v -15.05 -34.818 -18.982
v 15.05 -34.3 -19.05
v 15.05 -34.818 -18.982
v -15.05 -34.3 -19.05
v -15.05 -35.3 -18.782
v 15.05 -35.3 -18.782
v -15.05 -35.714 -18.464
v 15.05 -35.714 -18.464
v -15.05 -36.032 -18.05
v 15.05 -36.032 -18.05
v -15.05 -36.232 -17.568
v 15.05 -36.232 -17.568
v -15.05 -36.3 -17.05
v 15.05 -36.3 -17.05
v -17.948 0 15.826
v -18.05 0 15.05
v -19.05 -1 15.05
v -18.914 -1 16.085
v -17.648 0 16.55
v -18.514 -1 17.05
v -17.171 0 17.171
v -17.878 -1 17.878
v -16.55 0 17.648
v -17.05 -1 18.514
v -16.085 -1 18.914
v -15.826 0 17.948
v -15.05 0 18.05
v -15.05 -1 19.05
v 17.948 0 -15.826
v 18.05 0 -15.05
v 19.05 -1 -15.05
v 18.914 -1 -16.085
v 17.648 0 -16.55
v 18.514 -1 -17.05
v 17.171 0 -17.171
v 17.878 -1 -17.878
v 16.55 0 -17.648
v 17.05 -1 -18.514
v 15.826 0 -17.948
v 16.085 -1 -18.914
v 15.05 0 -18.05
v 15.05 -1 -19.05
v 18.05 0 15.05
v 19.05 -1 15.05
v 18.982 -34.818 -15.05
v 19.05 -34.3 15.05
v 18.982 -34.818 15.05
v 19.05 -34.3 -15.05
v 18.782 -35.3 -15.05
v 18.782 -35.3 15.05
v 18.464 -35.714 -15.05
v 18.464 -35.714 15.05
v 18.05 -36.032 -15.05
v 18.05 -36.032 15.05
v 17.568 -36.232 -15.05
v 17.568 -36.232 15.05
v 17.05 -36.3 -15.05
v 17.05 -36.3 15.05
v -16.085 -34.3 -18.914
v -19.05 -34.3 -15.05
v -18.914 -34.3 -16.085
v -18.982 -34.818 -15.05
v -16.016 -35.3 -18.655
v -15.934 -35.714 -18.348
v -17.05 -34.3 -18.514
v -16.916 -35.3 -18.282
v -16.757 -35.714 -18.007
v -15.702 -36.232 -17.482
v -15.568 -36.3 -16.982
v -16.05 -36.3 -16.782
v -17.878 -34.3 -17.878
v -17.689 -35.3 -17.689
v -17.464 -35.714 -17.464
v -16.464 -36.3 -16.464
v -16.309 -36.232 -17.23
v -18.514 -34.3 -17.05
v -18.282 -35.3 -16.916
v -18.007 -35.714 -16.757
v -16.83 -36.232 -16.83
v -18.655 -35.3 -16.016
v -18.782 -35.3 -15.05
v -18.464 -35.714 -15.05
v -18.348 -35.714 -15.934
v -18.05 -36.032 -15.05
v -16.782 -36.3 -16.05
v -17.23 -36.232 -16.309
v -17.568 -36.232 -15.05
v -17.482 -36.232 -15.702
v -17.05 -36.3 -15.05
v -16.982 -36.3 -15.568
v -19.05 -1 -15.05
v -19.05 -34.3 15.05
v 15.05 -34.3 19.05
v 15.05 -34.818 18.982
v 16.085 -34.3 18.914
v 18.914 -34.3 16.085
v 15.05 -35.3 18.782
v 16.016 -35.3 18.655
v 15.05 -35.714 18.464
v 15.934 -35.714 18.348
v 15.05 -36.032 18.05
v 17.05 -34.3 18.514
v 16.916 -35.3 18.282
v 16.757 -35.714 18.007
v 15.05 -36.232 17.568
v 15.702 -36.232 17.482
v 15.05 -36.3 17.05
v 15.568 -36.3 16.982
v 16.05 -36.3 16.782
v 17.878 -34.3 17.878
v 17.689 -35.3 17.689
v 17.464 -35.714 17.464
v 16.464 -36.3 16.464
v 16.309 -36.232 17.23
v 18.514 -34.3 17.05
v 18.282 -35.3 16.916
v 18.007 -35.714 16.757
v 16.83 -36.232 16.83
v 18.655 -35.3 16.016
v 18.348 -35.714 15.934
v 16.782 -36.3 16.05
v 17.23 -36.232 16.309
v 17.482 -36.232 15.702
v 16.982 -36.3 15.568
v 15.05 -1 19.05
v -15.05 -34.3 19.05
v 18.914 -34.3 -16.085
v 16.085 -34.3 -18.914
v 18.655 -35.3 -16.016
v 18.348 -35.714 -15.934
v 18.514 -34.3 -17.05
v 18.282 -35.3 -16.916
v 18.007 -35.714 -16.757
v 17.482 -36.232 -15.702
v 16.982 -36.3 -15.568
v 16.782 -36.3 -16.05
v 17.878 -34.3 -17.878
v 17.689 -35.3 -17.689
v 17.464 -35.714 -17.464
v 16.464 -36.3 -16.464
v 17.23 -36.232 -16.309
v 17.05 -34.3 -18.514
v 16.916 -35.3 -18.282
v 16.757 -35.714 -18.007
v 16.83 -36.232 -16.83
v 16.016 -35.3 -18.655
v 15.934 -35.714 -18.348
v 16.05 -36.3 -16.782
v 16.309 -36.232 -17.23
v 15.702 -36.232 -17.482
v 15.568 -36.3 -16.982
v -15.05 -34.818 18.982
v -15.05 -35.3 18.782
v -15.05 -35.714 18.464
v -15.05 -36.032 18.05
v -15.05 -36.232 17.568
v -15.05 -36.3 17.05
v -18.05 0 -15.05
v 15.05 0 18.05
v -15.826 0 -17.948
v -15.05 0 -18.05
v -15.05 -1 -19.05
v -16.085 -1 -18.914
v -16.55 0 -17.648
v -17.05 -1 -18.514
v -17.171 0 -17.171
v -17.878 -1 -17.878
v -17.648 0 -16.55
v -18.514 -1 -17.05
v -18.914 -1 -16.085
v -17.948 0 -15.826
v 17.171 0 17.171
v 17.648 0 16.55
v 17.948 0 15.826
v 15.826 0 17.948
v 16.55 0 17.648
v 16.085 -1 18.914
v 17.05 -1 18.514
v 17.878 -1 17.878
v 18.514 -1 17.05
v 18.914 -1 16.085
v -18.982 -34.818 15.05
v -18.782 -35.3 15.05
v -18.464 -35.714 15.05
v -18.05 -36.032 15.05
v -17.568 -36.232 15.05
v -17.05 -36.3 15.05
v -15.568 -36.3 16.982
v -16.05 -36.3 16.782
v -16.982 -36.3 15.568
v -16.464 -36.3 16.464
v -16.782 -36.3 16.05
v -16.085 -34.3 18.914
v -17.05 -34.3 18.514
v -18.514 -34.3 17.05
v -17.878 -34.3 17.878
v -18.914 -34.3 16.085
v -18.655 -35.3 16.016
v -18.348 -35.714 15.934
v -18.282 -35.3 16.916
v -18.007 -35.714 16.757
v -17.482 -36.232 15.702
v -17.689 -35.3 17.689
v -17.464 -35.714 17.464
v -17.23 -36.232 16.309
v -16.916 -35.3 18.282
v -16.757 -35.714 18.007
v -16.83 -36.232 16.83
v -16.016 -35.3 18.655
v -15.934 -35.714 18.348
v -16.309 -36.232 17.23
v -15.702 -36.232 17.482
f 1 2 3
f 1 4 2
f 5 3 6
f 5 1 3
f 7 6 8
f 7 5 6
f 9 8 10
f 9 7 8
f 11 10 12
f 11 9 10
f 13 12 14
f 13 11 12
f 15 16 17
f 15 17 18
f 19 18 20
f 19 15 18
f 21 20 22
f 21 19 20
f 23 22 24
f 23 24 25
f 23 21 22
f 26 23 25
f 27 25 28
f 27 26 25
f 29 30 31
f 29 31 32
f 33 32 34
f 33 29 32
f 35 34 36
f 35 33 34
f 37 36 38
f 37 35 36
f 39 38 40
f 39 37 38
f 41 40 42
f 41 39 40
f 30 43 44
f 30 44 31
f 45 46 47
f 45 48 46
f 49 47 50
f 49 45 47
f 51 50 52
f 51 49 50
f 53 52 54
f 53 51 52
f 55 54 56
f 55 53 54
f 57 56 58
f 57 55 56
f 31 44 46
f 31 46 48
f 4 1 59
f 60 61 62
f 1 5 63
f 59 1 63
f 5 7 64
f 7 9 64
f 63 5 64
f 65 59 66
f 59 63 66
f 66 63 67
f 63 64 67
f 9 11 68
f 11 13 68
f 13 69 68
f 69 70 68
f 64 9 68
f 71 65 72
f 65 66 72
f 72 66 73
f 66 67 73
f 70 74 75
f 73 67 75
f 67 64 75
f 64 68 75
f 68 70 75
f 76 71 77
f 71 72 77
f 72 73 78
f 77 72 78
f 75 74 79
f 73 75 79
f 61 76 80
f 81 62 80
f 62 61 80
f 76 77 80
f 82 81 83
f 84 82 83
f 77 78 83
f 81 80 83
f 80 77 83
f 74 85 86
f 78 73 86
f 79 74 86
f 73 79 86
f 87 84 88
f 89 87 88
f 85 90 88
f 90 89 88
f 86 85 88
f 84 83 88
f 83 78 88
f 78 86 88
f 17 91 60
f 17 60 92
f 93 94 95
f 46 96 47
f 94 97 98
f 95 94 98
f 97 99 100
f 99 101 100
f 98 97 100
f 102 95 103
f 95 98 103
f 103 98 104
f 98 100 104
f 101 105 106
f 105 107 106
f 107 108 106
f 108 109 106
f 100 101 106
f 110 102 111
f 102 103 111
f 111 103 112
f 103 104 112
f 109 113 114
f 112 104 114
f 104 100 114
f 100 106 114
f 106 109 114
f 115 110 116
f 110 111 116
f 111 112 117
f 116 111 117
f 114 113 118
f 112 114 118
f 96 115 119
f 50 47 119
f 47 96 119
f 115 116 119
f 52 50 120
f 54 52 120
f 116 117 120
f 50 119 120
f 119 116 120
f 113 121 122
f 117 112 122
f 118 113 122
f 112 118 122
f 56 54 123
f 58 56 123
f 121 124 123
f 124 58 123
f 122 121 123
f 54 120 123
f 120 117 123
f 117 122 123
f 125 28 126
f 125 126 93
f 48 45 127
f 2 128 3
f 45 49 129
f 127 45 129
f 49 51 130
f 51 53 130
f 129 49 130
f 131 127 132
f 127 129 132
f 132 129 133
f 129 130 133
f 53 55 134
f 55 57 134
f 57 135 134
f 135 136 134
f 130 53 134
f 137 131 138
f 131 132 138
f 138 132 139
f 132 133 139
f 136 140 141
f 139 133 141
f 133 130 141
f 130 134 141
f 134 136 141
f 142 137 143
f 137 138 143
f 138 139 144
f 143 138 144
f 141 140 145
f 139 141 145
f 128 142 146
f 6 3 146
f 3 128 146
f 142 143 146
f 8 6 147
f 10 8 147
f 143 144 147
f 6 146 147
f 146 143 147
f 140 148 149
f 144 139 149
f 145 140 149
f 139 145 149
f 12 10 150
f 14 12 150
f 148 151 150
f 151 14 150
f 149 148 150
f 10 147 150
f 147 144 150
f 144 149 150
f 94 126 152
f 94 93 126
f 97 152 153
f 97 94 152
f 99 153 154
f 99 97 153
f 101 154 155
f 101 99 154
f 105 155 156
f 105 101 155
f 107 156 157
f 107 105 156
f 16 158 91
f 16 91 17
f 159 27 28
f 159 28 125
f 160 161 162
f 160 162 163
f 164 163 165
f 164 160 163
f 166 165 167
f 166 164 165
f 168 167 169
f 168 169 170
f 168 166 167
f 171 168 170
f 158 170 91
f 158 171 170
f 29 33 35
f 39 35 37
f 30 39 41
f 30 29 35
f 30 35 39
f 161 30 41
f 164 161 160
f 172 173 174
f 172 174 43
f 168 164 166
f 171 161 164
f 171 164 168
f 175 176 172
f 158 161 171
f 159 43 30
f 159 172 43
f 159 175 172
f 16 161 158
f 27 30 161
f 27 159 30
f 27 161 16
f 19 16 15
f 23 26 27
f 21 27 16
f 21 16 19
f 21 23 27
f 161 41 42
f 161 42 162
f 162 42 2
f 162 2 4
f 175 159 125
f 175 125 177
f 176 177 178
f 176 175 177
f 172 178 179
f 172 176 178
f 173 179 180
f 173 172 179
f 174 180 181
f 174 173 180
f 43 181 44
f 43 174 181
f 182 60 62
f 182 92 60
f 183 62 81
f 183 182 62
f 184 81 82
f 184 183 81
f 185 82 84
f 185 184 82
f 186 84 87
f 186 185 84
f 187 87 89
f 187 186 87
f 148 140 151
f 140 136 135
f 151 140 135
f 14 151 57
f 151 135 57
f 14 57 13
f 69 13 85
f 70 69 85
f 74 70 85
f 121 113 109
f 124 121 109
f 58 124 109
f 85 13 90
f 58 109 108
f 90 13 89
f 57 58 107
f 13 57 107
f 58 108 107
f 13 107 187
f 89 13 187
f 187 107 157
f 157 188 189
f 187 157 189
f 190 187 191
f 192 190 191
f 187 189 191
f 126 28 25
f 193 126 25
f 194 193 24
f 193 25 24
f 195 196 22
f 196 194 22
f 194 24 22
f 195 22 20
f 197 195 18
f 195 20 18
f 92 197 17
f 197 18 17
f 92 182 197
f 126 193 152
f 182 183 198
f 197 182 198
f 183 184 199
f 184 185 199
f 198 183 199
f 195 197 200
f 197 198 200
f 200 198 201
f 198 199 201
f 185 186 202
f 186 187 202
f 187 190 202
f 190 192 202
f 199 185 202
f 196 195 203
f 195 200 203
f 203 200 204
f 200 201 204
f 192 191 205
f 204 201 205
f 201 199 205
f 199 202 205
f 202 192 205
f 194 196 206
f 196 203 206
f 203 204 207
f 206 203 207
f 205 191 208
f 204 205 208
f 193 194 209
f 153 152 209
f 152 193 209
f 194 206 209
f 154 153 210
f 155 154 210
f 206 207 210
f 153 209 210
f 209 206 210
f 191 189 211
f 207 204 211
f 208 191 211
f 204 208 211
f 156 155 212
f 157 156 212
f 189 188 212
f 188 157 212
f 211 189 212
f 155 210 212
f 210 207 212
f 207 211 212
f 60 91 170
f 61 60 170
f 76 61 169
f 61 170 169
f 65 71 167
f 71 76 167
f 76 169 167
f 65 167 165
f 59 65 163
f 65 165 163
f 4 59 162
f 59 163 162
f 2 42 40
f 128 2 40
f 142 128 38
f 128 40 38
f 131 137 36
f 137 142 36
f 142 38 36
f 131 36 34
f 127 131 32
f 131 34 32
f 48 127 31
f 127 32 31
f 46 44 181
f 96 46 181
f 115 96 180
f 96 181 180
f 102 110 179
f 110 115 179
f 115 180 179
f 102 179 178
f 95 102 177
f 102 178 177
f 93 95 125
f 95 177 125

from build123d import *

# Parameters (mm, degrees)
PAD_DEPTH    = 36.3
CHAMFER_SIZE = 1
FILLET_R     = 2


with BuildPart() as part:
    # Sketch → Pad (new body)
    with BuildSketch(Plane.XZ):
        with BuildLine():
            Line((-15.05, 19.05), (15.05, 19.05))
            ThreePointArc((19.05, 15.05), (17.878427, 17.878427), (15.05, 19.05))
            Line((19.05, 15.05), (19.05, -15.05))
            ThreePointArc((15.05, -19.05), (17.878427, -17.878427), (19.05, -15.05))
            Line((15.05, -19.05), (-15.05, -19.05))
            ThreePointArc((-19.05, -15.05), (-17.878427, -17.878427), (-15.05, -19.05))
            Line((-19.05, -15.05), (-19.05, 15.05))
            ThreePointArc((-15.05, 19.05), (-17.878427, 17.878427), (-19.05, 15.05))
        make_face()
    extrude(amount=PAD_DEPTH)

    # Chamfer
    chamfer_edges = [part.edges().sort_by_distance(p)[0] for p in [
        (0, 0, 19.05),
        (17.878427, 0, 17.878427),
        (19.05, 0, 0),
        (17.878427, 0, -17.878427),
        (0, 0, -19.05),
        (-17.878427, 0, -17.878427),
        (-19.05, 0, 0),
        (-17.878427, 0, 17.878427),
    ]]
    chamfer(chamfer_edges, length=CHAMFER_SIZE)

    # Fillet
    fillet_edges = [part.edges().sort_by_distance(p)[0] for p in [
        (0, -36.3, 19.05),
        (17.878427, -36.3, 17.878427),
        (19.05, -36.3, 0),
        (17.878427, -36.3, -17.878427),
        (0, -36.3, -19.05),
        (-17.878427, -36.3, -17.878427),
        (-19.05, -36.3, 0),
        (-17.878427, -36.3, 17.878427),
    ]]
    fillet(fillet_edges, radius=FILLET_R)


solid = part.part
